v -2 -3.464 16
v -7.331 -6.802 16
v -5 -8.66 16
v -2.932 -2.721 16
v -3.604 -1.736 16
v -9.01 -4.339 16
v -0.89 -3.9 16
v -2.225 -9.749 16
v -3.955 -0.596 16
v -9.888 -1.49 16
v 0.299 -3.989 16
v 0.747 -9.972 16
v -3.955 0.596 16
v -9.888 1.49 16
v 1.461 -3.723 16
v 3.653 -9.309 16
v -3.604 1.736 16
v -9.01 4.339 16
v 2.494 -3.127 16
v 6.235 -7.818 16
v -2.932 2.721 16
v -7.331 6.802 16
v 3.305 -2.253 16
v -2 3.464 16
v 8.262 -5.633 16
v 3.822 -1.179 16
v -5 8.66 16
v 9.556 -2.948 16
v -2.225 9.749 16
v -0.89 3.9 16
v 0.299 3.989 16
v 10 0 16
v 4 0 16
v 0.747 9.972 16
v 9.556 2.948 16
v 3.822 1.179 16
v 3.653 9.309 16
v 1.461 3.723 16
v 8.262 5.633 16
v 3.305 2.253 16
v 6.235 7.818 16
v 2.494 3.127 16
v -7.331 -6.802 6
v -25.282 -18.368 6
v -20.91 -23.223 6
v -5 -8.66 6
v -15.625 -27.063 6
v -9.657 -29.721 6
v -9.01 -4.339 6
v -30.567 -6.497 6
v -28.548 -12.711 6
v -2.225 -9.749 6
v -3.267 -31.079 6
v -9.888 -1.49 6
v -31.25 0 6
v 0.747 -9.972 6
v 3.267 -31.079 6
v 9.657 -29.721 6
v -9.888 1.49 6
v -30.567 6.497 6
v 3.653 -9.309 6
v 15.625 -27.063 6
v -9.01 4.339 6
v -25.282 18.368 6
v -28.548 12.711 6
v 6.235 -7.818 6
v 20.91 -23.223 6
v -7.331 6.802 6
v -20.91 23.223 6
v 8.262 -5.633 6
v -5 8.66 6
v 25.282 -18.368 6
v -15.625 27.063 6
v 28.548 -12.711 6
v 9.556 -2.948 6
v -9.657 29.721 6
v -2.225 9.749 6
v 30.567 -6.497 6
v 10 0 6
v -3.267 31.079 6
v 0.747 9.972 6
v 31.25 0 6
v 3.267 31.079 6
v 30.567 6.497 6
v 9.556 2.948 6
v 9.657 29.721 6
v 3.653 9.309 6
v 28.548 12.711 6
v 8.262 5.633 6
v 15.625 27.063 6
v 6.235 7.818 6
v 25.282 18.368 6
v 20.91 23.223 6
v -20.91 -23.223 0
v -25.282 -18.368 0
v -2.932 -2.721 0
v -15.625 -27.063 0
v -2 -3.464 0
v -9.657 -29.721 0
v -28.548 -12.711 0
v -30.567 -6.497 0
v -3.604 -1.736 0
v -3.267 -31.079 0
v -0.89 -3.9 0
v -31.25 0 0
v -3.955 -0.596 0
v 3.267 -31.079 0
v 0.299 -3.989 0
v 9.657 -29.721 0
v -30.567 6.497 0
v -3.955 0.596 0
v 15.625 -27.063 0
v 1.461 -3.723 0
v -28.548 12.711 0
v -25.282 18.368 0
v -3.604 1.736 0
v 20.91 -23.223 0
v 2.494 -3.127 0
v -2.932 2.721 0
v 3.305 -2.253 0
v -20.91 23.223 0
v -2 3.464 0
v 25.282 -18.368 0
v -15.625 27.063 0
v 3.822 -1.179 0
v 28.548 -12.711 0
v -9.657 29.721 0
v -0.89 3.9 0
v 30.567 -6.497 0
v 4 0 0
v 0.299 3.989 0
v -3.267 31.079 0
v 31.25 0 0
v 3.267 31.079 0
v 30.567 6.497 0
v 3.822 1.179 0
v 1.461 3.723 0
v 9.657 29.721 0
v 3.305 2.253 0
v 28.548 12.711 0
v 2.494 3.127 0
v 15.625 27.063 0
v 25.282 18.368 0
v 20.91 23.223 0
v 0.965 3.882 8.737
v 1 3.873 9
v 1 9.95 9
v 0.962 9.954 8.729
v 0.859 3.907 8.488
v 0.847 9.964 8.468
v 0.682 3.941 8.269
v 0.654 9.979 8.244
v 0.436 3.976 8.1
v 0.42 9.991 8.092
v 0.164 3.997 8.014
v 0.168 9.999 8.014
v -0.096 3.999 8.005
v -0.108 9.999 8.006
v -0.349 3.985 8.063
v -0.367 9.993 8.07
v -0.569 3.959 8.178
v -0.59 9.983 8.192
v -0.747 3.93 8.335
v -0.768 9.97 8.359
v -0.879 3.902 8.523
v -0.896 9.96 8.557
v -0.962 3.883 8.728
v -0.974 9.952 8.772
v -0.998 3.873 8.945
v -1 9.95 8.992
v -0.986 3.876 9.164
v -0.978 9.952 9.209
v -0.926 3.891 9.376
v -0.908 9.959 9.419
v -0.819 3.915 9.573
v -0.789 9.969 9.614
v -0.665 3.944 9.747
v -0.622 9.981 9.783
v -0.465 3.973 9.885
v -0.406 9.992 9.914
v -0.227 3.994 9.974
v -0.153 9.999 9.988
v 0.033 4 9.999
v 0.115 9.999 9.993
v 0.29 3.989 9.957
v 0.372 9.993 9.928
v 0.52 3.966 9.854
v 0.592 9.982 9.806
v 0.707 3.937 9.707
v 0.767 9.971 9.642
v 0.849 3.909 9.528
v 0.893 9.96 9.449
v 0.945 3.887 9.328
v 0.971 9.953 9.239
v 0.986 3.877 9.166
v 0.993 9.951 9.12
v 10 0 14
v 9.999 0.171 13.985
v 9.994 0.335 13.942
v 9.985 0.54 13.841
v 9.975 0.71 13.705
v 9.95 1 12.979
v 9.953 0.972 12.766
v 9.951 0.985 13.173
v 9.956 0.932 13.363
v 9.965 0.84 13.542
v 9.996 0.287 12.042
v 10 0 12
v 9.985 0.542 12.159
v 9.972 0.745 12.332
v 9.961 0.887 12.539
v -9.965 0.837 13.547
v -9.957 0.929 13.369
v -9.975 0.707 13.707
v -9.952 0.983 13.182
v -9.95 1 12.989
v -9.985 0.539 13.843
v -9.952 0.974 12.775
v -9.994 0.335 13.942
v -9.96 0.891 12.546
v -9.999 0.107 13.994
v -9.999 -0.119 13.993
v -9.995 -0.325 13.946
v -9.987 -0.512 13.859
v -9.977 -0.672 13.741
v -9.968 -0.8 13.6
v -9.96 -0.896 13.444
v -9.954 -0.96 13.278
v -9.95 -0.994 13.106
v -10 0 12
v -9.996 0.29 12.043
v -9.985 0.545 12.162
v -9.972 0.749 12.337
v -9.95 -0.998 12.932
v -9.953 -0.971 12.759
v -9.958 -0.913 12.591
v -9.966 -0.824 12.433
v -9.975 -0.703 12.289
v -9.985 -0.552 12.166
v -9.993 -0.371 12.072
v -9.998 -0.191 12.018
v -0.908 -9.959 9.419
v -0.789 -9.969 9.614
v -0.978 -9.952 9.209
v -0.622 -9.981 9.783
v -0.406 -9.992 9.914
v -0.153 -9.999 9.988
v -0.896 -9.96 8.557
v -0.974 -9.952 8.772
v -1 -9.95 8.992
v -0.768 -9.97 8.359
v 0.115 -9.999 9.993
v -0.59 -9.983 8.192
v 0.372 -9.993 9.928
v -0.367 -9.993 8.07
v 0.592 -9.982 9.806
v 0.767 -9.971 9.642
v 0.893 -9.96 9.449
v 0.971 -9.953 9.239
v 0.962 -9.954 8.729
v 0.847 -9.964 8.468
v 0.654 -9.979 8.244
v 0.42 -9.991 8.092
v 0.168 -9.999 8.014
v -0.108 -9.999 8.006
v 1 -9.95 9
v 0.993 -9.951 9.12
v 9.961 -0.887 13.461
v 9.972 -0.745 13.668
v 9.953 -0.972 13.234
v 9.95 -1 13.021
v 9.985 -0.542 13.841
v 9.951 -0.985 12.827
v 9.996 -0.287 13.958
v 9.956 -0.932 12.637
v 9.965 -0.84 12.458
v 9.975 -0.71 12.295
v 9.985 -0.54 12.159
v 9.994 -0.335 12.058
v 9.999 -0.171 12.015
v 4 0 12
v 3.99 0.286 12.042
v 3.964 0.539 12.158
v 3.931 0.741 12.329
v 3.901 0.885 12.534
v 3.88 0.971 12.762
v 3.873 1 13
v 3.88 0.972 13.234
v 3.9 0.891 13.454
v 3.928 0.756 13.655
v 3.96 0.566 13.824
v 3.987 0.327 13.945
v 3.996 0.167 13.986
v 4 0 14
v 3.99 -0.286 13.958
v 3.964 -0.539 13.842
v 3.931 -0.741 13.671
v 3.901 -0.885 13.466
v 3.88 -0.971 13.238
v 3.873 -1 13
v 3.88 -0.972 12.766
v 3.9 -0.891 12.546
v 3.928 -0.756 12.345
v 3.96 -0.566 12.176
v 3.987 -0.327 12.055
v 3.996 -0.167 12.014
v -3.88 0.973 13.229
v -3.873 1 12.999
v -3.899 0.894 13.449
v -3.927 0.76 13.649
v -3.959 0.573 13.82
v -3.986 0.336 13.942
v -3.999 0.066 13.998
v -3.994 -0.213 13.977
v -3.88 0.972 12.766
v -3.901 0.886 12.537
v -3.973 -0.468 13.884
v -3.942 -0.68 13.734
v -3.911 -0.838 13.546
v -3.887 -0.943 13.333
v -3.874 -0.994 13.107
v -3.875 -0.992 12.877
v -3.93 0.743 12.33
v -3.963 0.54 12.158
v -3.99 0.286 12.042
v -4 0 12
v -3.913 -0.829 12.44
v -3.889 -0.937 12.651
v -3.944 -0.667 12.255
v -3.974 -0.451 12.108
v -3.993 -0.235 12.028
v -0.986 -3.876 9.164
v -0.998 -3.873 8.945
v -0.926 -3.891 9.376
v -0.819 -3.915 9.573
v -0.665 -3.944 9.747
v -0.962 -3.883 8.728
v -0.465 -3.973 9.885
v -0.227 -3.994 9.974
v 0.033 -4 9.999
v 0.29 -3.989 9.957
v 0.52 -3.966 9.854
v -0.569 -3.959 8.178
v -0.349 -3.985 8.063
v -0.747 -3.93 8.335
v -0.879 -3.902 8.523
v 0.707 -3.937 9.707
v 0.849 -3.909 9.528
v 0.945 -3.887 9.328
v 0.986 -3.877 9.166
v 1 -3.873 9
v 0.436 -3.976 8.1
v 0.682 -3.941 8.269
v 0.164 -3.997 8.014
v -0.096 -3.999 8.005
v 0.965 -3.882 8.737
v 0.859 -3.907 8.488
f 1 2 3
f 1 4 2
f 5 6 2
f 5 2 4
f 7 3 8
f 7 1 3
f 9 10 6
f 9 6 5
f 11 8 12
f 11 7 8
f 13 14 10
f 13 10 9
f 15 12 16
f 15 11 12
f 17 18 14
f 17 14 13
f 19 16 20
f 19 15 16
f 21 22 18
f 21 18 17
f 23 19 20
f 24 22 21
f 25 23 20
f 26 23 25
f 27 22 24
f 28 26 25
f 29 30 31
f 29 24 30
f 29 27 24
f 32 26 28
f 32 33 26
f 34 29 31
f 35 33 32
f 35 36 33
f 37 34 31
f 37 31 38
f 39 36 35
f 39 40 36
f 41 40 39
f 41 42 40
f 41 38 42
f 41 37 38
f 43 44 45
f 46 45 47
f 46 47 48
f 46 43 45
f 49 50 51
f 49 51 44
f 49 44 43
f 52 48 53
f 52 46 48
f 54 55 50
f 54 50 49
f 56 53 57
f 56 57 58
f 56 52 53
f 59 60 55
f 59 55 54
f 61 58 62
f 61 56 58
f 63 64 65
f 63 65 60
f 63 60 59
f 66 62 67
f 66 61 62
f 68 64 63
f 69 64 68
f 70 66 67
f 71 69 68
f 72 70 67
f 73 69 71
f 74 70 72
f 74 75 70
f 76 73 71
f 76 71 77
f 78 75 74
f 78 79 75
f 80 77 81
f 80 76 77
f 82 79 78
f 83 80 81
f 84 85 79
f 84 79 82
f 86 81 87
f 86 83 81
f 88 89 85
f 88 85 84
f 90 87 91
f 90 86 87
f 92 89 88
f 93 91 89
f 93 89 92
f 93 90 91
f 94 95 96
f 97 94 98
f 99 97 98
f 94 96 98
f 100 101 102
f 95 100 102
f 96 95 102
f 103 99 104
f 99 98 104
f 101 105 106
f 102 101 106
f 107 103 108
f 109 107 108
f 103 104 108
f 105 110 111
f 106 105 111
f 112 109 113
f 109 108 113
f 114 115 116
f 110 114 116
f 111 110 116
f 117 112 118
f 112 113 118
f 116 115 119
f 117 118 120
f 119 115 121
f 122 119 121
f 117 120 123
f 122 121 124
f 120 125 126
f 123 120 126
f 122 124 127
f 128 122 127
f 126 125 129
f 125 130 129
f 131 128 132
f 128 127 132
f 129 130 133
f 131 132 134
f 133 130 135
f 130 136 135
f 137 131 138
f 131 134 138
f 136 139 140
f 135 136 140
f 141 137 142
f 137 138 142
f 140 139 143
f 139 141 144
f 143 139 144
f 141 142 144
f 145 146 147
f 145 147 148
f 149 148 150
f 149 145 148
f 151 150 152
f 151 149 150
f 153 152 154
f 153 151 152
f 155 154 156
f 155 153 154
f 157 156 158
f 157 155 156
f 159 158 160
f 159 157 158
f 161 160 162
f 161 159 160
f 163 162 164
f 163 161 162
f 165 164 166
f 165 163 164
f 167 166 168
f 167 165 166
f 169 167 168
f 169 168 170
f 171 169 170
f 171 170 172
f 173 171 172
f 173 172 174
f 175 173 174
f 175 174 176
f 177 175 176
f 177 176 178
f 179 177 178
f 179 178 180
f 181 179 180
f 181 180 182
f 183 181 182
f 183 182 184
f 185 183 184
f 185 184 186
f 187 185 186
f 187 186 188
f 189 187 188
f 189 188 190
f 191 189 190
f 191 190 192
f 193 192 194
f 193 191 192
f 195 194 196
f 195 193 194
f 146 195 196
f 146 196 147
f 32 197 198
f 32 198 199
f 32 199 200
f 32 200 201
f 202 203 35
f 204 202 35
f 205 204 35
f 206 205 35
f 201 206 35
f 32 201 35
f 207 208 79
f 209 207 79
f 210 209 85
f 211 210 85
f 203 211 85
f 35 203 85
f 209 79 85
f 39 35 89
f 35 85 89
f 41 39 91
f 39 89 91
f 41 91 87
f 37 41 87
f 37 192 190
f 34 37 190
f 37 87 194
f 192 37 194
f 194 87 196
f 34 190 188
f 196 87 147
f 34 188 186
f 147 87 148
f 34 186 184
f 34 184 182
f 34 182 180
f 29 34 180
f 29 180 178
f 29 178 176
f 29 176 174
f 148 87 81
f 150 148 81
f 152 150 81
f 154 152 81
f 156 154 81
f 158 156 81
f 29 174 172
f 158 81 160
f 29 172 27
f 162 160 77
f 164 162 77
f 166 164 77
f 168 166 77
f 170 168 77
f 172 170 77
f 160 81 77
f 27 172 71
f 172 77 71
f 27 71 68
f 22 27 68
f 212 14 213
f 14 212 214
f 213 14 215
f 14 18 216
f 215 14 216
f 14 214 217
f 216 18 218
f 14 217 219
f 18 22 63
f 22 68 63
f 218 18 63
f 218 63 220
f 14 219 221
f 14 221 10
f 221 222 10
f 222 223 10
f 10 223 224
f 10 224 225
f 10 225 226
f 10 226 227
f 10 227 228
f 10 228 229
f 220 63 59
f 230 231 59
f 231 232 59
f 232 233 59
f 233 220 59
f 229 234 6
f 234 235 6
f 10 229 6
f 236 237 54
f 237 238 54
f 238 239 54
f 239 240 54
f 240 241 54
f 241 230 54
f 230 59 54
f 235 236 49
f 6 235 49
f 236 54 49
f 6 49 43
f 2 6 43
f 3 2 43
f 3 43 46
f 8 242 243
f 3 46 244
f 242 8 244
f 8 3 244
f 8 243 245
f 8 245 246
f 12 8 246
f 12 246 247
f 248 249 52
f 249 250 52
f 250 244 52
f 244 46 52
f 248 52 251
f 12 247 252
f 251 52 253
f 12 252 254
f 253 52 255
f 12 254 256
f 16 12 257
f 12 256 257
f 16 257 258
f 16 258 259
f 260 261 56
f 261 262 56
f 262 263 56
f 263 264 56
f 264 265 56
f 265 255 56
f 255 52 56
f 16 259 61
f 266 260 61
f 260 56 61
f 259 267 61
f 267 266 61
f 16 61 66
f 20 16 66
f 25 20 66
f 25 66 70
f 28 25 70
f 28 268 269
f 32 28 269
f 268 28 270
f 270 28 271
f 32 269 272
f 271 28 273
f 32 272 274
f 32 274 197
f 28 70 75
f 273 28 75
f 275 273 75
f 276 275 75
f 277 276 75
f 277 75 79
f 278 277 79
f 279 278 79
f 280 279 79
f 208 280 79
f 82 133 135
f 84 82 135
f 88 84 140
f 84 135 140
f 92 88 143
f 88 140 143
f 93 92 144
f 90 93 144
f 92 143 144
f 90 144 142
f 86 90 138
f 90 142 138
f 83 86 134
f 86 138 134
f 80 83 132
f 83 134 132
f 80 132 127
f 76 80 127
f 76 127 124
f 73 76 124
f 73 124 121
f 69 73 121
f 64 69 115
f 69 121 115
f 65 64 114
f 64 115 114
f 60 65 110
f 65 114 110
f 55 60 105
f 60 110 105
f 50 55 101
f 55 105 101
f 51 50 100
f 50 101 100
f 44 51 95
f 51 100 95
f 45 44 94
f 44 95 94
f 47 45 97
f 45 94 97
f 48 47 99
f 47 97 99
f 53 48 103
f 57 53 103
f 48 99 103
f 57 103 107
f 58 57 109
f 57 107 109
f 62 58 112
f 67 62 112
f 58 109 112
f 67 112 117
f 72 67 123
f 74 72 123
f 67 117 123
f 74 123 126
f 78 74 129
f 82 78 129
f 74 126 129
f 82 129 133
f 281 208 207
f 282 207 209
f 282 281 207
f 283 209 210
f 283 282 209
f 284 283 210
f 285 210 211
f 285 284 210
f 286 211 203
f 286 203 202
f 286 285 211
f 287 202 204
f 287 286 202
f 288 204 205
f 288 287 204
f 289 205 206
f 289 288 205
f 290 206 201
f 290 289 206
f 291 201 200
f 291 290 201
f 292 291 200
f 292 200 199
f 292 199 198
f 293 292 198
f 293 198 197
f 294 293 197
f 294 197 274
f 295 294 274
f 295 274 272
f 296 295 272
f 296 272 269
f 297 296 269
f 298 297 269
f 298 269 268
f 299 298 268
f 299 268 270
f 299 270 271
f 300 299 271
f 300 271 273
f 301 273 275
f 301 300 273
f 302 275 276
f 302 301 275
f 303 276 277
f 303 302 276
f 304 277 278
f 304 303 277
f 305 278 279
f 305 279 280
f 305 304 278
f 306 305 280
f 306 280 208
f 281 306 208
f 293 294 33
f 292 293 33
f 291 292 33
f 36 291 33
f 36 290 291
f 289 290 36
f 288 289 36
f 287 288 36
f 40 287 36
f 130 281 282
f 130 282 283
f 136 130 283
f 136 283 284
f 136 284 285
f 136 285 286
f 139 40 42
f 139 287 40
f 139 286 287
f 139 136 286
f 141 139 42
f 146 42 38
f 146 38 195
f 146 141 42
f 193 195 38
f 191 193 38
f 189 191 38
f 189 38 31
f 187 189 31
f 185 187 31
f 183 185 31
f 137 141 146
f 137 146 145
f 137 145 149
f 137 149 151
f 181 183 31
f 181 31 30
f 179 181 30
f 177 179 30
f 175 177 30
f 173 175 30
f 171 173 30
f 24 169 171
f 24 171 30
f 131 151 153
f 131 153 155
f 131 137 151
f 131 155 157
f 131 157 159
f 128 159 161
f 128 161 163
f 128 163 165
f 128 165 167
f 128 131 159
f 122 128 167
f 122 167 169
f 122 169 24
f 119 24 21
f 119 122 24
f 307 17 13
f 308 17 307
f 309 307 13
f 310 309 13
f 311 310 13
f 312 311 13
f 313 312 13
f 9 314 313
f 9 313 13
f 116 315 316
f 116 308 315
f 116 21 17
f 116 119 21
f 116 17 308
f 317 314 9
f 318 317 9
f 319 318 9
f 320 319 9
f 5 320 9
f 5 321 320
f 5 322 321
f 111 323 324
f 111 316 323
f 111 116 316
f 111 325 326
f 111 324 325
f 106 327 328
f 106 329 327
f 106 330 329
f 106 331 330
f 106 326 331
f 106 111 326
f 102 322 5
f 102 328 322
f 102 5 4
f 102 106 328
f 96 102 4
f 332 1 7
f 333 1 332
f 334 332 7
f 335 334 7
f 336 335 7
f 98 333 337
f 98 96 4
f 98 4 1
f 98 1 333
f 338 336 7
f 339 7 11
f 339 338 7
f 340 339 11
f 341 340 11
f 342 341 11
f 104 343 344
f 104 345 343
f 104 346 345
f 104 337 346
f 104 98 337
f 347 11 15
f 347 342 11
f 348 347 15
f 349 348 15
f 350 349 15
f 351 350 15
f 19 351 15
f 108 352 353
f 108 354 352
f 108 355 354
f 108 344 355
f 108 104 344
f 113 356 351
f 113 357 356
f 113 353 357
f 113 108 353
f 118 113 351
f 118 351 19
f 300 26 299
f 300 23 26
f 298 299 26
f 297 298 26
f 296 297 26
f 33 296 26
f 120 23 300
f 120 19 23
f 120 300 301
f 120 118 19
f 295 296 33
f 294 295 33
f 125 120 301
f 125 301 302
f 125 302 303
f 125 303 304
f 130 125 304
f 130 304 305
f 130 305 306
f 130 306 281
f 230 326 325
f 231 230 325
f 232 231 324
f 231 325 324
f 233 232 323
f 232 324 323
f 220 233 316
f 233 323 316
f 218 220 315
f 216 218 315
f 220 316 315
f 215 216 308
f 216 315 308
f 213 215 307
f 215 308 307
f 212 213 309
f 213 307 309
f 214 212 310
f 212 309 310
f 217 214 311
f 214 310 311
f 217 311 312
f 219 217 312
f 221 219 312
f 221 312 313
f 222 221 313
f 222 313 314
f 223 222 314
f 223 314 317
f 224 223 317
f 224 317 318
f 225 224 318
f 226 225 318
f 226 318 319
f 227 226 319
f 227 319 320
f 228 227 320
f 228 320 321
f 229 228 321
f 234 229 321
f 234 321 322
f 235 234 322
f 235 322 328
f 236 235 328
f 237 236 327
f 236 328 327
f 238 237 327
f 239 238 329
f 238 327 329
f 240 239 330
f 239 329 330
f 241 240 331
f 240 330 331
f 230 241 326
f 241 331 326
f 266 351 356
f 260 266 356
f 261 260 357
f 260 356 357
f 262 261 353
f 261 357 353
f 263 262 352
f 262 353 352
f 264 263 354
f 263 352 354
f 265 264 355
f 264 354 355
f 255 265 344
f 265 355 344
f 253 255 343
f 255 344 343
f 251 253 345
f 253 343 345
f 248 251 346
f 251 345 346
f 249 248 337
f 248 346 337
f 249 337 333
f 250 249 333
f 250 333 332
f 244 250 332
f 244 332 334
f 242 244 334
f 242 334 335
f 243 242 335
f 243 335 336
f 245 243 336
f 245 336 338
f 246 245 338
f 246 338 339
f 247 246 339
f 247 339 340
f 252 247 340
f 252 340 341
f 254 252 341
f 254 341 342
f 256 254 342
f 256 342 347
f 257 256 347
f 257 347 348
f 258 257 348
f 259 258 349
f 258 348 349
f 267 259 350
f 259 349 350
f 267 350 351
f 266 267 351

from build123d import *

# Parameters (mm, degrees)
SKETCH_1_R               = 31.25
SKETCH_1_R_2             = 4
EXTRUDE_1_DEPTH          = 6
SKETCH_2_R               = 10
SKETCH_2_R_2             = 4
EXTRUDE_2_DEPTH          = 10
SKETCH_3_R               = 1
CUT_EXTRUDE_1_DEPTH      = 32.25
CUT_EXTRUDE_1_DEPTH_BACK = 32.25
SKETCH_4_R               = 1
CUT_EXTRUDE_2_DEPTH      = 32.25
CUT_EXTRUDE_2_DEPTH_BACK = 32.25


with BuildPart() as part:
    # Эскиз1 → Бобышка-Вытянуть1 (new body)
    with BuildSketch(Plane.XY):
        Circle(SKETCH_1_R)
        Circle(SKETCH_1_R_2, mode=Mode.SUBTRACT)
    extrude(amount=EXTRUDE_1_DEPTH)

    # Эскиз2 → Бобышка-Вытянуть2 (add)
    with BuildSketch(Plane.XY.offset(6)):
        Circle(SKETCH_2_R)
        Circle(SKETCH_2_R_2, mode=Mode.SUBTRACT)
    extrude(amount=EXTRUDE_2_DEPTH)

    # Эскиз3 → Вырез-Вытянуть1 (cut, two sides)
    with BuildSketch(Plane(origin=(0, 0, 0), x_dir=(1, 0, 0), z_dir=(0, 1, 0))) as cut_extrude_1_sk:
        with Locations((0, -9)):
            Circle(SKETCH_3_R)
    extrude(amount=CUT_EXTRUDE_1_DEPTH, mode=Mode.SUBTRACT)
    extrude(cut_extrude_1_sk.sketch, amount=-CUT_EXTRUDE_1_DEPTH_BACK, mode=Mode.SUBTRACT)

    # Эскиз4 → Вырез-Вытянуть2 (cut, two sides)
    with BuildSketch(Plane(origin=(0, 0, 0), x_dir=(0, 0, -1), z_dir=(1, 0, 0))) as cut_extrude_2_sk:
        with Locations((-13, 0)):
            Circle(SKETCH_4_R)
    extrude(amount=CUT_EXTRUDE_2_DEPTH, mode=Mode.SUBTRACT)
    extrude(cut_extrude_2_sk.sketch, amount=-CUT_EXTRUDE_2_DEPTH_BACK, mode=Mode.SUBTRACT)


solid = part.part
